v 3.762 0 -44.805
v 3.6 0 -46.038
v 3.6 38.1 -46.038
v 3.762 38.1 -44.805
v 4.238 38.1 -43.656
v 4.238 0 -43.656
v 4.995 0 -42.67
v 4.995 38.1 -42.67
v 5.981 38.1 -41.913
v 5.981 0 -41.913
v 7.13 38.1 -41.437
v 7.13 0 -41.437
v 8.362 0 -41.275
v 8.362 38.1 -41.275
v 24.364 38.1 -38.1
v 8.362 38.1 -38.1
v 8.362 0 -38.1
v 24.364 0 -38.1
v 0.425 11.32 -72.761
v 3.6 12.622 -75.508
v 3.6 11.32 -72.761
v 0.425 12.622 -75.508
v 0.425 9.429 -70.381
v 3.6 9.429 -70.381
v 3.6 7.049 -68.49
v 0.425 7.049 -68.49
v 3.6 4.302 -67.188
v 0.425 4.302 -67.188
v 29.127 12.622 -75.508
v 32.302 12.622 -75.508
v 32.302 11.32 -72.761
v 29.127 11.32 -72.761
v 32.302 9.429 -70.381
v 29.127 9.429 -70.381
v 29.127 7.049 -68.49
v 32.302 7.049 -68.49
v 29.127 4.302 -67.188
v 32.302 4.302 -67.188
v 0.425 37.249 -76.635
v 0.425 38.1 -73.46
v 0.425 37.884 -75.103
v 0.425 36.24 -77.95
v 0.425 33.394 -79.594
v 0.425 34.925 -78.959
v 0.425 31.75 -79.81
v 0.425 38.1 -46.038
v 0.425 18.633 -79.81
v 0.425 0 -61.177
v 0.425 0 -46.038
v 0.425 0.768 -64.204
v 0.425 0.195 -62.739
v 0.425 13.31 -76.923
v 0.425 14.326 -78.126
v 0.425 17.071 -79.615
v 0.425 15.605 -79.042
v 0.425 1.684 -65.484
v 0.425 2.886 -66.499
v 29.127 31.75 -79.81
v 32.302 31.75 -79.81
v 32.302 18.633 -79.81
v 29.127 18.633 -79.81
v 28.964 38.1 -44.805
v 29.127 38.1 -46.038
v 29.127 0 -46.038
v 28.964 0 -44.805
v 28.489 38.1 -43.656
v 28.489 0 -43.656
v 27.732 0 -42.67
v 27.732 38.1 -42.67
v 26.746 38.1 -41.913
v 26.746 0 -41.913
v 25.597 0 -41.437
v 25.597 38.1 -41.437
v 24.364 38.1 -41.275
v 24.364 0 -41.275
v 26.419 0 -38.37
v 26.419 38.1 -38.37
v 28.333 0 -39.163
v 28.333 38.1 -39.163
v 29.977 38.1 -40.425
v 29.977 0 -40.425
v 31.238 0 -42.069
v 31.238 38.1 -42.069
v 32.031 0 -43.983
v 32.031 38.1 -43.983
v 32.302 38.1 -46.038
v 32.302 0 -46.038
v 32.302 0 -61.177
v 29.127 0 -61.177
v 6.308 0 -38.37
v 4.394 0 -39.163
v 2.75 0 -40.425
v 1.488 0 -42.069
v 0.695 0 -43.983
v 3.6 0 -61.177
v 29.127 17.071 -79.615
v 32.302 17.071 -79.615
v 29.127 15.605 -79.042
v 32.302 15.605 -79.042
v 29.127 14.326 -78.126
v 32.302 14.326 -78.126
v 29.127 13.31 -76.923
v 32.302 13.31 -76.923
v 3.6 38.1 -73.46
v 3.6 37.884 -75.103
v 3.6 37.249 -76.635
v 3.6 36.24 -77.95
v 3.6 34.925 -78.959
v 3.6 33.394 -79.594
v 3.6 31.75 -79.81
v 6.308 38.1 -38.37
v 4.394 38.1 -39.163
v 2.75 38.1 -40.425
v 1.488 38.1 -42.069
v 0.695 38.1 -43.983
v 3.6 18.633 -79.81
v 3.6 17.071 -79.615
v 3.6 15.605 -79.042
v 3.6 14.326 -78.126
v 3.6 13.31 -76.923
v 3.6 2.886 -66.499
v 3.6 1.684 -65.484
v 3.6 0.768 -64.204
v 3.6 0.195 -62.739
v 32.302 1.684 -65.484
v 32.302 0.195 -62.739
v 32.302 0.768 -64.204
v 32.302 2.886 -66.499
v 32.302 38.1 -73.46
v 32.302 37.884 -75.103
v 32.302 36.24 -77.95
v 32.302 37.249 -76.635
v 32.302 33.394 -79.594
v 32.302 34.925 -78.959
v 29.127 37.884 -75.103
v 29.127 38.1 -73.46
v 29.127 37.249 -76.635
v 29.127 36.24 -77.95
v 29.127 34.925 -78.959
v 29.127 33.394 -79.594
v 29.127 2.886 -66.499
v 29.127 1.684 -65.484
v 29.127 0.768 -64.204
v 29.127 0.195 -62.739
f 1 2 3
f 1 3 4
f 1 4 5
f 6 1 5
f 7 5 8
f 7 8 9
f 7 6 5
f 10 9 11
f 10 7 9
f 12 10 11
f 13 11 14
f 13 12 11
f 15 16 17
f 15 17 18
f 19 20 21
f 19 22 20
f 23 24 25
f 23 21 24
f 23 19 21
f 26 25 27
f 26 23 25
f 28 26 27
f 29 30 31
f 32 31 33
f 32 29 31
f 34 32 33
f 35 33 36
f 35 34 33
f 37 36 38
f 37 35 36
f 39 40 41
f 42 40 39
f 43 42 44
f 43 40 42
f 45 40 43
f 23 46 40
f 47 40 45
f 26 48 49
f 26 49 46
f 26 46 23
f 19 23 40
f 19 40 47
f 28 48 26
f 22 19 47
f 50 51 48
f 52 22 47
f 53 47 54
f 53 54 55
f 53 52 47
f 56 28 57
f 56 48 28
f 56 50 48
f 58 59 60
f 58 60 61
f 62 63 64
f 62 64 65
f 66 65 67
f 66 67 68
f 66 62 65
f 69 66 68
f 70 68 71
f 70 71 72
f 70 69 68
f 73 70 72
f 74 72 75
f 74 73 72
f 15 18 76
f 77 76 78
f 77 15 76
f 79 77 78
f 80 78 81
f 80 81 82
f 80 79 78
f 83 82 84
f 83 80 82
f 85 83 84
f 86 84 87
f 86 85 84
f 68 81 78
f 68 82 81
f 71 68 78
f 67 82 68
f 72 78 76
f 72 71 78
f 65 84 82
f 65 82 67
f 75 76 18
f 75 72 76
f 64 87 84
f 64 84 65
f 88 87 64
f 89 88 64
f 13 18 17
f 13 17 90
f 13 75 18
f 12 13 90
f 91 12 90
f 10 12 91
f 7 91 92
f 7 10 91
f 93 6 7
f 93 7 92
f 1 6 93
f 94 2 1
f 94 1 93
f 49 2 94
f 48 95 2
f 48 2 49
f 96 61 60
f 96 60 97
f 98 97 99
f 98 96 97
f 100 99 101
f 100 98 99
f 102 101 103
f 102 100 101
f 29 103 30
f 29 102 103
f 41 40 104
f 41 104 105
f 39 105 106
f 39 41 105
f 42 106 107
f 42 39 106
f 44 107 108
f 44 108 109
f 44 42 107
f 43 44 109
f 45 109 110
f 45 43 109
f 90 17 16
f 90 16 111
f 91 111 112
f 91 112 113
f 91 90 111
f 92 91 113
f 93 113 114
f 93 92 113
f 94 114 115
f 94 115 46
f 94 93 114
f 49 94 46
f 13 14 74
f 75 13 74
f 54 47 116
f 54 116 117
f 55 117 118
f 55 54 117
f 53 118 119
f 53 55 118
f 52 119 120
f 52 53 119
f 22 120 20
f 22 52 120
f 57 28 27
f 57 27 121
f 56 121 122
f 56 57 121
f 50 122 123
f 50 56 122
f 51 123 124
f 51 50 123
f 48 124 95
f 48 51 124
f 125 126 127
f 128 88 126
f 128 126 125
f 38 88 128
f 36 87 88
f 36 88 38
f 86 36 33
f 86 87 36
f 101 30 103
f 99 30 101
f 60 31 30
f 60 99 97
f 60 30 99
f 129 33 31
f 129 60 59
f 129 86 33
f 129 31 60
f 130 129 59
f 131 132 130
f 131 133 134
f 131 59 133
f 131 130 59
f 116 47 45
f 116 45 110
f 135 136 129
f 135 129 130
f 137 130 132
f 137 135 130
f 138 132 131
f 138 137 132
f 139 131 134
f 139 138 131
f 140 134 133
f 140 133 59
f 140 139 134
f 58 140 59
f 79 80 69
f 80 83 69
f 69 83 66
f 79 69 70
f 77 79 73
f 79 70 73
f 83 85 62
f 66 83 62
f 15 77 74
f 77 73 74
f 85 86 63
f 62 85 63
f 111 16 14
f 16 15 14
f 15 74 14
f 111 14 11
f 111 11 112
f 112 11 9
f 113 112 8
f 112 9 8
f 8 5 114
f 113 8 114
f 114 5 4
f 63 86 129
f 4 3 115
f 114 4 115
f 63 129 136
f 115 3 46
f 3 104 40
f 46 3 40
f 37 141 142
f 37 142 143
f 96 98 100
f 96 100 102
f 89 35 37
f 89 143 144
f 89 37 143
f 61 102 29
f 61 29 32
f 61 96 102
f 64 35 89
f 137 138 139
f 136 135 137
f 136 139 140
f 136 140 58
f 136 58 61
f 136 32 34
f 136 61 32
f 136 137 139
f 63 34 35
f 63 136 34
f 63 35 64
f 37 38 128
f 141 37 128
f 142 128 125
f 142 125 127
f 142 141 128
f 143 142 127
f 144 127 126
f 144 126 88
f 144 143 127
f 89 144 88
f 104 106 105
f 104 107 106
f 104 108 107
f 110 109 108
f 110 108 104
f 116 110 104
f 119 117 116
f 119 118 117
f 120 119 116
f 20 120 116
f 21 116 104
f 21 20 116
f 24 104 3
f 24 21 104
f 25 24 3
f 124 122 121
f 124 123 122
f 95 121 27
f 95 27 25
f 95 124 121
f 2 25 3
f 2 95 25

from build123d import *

# Parameters (mm, degrees)
SKETCH1_W                      = 31.877
SKETCH1_H                      = 38.1
BASE_FLANGE1_DEPTH             = 3.175
EDGE_FLANGE1_STRIP_W           = 22.225
EDGE_FLANGE1_STRIP_H           = 3.175
EDGE_FLANGE1_STRIP_CUT_DEPTH   = 38.1
EDGE_FLANGE1_STRIP_2_W         = 22.225
EDGE_FLANGE1_STRIP_2_H         = 3.175
EDGE_FLANGE1_STRIP_CUT_2_DEPTH = 38.1
EDGE_FLANGE1_DEPTH             = 38.1
EDGE_FLANGE1_BEND_DEPTH        = 38.1
CUT_EXTRUDE1_DEPTH             = 95.152162324
CUT_EXTRUDE1_DEPTH_BACK        = 95.152162324
SKETCH12_R                     = 13.335
BREAK_CORNER1_START            = 0.424763322
BREAK_CORNER1_DEPTH            = 31.877


# Read off the part's stored shape, not the designer's step: Break-Corner1
# Sheet-metal steps are written as plain solids
with BuildPart() as part:
    # Sketch1 → Base-Flange1 (new body)
    with BuildSketch(Plane.XY.offset(-38.1)):
        with Locations((16.363263322, 19.05)):
            Rectangle(SKETCH1_W, SKETCH1_H)
    extrude(amount=-BASE_FLANGE1_DEPTH)

    # Edge-Flange1 strip (across the edge) → Edge-Flange1 strip cut (cut)
    with BuildSketch(Plane(origin=(32.301763322, 38.1, -41.275), x_dir=(-1, 0, 0), z_dir=(0, -1, 0))):
        with Locations((-3.175, -1.5875)):
            Rectangle(EDGE_FLANGE1_STRIP_W, EDGE_FLANGE1_STRIP_H)
    extrude(amount=EDGE_FLANGE1_STRIP_CUT_DEPTH, mode=Mode.SUBTRACT)

    # Edge-Flange1 strip 2 (across the edge) → Edge-Flange1 strip cut 2 (cut)
    with BuildSketch(Plane(origin=(0.424763322, 0, -41.275), x_dir=(1, 0, 0), z_dir=(0, 1, 0))):
        with Locations((-3.175, -1.5875)):
            Rectangle(EDGE_FLANGE1_STRIP_2_W, EDGE_FLANGE1_STRIP_2_H)
    extrude(amount=EDGE_FLANGE1_STRIP_CUT_2_DEPTH, mode=Mode.SUBTRACT)

    # Edge-Flange1 section (across the edge) → Edge-Flange1 (add)
    with BuildSketch(Plane(origin=(32.301763322, 38.1, -41.275), x_dir=(-1, 0, 0), z_dir=(0, -1, 0))):
        with BuildLine():
            Line((0, 4.7625), (0, 38.534872551))
            Line((0, 38.534872551), (3.175, 38.534872551))
            Line((3.175, 38.534872551), (3.175, 4.7625))
            ThreePointArc((3.175, 4.7625), (4.569903955, 1.394903955), (7.9375, 0))
            Line((7.9375, 0), (7.9375, -3.175))
            ThreePointArc((7.9375, -3.175), (2.324839924, -0.850160076), (0, 4.7625))
        make_face()
    extrude(amount=EDGE_FLANGE1_DEPTH)

    # Edge-Flange1 section 2 (across the edge) → Edge-Flange1 bend (add)
    with BuildSketch(Plane(origin=(0.424763322, 0, -41.275), x_dir=(1, 0, 0), z_dir=(0, 1, 0))):
        with BuildLine():
            Line((0, 4.7625), (0, 38.534872551))
            Line((0, 38.534872551), (3.175, 38.534872551))
            Line((3.175, 38.534872551), (3.175, 4.7625))
            ThreePointArc((3.175, 4.7625), (4.569903955, 1.394903955), (7.9375, 0))
            Line((7.9375, 0), (7.9375, -3.175))
            ThreePointArc((7.9375, -3.175), (2.324839924, -0.850160076), (0, 4.7625))
        make_face()
    extrude(amount=EDGE_FLANGE1_BEND_DEPTH)

    # Sketch12 → Cut-Extrude1 (cut, two sides: drawn at the far end of the back side and taken through both)
    with BuildSketch(Plane(origin=(0, 0, 0), x_dir=(0, 0, -1), z_dir=(1, 0, 0)).offset(-CUT_EXTRUDE1_DEPTH_BACK)):
        with Locations((79.809872551, 0)):
            Circle(SKETCH12_R)
    extrude(amount=CUT_EXTRUDE1_DEPTH + CUT_EXTRUDE1_DEPTH_BACK, mode=Mode.SUBTRACT)

    # Break-Corner1 outline → Break-Corner1 (cut)
    with BuildSketch(Plane.YZ.offset(BREAK_CORNER1_START)):
        with BuildLine():
            Line((13.335, -79.809872551), (18.632678954, -79.809872551))
            ThreePointArc((18.632678954, -79.809872551), (14.937057089, -78.623677256), (12.622137356, -75.508259648))
            ThreePointArc((12.622137356, -75.508259648), (13.15557727, -77.629732262), (13.335, -79.809872551))
        make_face()
        with BuildLine():
            ThreePointArc((38.1, -73.459872551), (36.24012806, -77.950000612), (31.75, -79.809872551))
            Line((31.75, -79.809872551), (38.1, -79.809872551))
            Line((38.1, -79.809872551), (38.1, -73.459872551))
        make_face()
        with BuildLine():
            ThreePointArc((0, -66.474872551), (2.180140289, -66.654295281), (4.301612903, -67.187735195))
            ThreePointArc((4.301612903, -67.187735195), (1.186195295, -64.872815462), (0, -61.177193597))
            Line((0, -61.177193597), (0, -66.474872551))
        make_face()
    extrude(amount=BREAK_CORNER1_DEPTH, mode=Mode.SUBTRACT)


solid = part.part
